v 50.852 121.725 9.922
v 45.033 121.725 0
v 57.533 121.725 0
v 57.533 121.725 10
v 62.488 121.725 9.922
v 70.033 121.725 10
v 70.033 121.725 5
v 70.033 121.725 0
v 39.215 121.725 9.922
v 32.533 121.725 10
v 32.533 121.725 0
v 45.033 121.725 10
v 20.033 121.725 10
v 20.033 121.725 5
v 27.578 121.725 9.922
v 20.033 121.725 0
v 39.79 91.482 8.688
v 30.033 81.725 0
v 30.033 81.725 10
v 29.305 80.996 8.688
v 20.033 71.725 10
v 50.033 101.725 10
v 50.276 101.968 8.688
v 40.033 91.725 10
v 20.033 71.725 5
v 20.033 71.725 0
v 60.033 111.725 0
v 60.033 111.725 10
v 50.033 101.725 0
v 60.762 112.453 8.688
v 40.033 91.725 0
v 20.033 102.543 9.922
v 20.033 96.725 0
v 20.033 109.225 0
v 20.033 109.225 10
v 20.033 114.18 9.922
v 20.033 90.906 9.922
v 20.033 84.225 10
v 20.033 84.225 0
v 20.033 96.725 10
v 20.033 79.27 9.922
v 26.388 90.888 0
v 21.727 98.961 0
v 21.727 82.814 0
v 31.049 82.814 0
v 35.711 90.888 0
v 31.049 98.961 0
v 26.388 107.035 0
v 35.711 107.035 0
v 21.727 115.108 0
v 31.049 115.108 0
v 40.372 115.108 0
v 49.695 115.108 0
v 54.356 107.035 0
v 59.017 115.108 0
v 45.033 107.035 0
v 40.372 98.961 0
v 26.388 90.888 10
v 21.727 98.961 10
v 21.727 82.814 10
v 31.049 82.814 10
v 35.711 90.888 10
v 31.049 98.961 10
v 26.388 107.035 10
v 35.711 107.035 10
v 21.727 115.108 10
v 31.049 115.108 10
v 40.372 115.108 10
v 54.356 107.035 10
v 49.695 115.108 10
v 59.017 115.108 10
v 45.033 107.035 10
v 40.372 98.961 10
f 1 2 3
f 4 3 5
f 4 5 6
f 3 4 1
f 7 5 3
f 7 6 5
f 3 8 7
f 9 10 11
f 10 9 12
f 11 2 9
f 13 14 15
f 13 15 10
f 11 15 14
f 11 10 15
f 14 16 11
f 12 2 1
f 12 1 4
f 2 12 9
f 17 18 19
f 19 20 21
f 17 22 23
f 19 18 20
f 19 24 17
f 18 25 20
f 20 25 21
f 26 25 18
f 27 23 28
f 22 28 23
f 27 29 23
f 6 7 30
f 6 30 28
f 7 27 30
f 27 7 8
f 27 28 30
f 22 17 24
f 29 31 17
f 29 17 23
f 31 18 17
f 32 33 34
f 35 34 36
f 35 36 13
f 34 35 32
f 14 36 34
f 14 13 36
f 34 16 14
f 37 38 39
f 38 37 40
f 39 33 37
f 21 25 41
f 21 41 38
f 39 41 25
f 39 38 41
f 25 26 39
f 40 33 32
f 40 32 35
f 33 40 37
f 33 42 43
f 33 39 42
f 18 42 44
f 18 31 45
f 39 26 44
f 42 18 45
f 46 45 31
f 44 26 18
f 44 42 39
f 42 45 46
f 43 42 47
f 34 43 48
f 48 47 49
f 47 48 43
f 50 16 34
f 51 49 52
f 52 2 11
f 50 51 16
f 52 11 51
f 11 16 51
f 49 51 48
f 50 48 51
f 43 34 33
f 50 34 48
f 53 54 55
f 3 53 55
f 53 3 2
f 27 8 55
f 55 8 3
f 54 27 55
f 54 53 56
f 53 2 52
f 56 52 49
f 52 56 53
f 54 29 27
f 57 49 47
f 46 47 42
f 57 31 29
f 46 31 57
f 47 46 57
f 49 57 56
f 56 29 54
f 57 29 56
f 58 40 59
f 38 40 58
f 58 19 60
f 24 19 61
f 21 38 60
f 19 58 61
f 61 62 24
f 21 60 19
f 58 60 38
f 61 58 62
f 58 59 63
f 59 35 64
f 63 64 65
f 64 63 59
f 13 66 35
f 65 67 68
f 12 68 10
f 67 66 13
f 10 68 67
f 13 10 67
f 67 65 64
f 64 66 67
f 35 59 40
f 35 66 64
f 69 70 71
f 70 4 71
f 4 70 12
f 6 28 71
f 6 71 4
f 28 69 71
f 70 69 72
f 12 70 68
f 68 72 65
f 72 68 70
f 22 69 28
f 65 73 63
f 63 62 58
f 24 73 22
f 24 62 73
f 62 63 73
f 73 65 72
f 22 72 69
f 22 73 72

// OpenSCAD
// CSG file generated from FreeCAD 0.20.29177 (Git)
group() {
 group(){
polyhedron ( points = [[20.033276,121.724854,0.000000],[20.033276,121.724854,10.000000],[70.033279,121.724854,0.000000],[70.033279,121.724854,10.000000],[20.033276,71.724854,0.000000],[20.033276,71.724854,10.000000],[20.033276,121.724854,5.000000],[70.033279,121.724854,5.000000],[32.533276,121.724854,0.000000],[45.033276,121.724854,0.000000],[57.533276,121.724854,0.000000],[32.533276,121.724854,10.000000],[45.033276,121.724854,10.000000],[57.533276,121.724854,10.000000],[20.033276,71.724854,5.000000],[60.033276,111.724854,0.000000],[50.033276,101.724854,0.000000],[40.033276,91.724854,0.000000],[30.033276,81.724854,0.000000],[60.033276,111.724854,10.000000],[50.033276,101.724854,10.000000],[40.033276,91.724854,10.000000],[30.033276,81.724854,10.000000],[20.033276,84.224854,0.000000],[20.033276,96.724854,0.000000],[20.033276,109.224854,0.000000],[20.033276,84.224854,10.000000],[20.033276,96.724854,10.000000],[20.033276,109.224854,10.000000],[62.488403,121.724854,9.922277],[50.851650,121.724854,9.922277],[39.214901,121.724854,9.922277],[27.578150,121.724854,9.922277],[29.304789,80.996368,8.687840],[39.790447,91.482025,8.687840],[50.276104,101.967690,8.687840],[60.761765,112.453346,8.687840],[20.033276,114.179985,9.922277],[20.033276,102.543236,9.922277],[20.033276,90.906479,9.922277],[20.033276,79.269730,9.922277],[26.388117,90.887627,0.000000],[35.710697,107.034813,0.000000],[54.355854,107.034813,0.000000],[21.726828,98.961220,0.000000],[31.049406,82.814041,0.000000],[21.726828,82.814041,0.000000],[35.710697,90.887627,0.000000],[31.049406,98.961220,0.000000],[26.388117,107.034813,0.000000],[21.726828,115.108398,0.000000],[31.049406,115.108398,0.000000],[40.371986,115.108398,0.000000],[49.694565,115.108398,0.000000],[59.017143,115.108398,0.000000],[45.033276,107.034813,0.000000],[40.371986,98.961220,0.000000],[26.388117,90.887627,10.000000],[35.710697,107.034813,10.000000],[54.355854,107.034813,10.000000],[21.726828,98.961220,10.000000],[31.049406,82.814041,10.000000],[21.726828,82.814041,10.000000],[35.710697,90.887627,10.000000],[31.049406,98.961220,10.000000],[26.388117,107.034813,10.000000],[21.726828,115.108398,10.000000],[31.049406,115.108398,10.000000],[40.371986,115.108398,10.000000],[49.694565,115.108398,10.000000],[59.017143,115.108398,10.000000],[45.033276,107.034813,10.000000],[40.371986,98.961220,10.000000]], faces = [[10,9,30],[29,10,13],[3,29,13],[30,13,10],[10,29,7],[29,3,7],[7,2,10],[8,11,31],[12,31,11],[31,9,8],[32,6,1],[11,32,1],[6,32,8],[32,11,8],[8,0,6],[30,9,12],[13,30,12],[31,12,9],[22,18,34],[5,33,22],[35,20,34],[33,18,22],[34,21,22],[33,14,18],[5,14,33],[18,14,4],[19,35,15],[35,19,20],[35,16,15],[36,7,3],[19,36,3],[36,15,7],[2,7,15],[36,19,15],[21,34,20],[34,17,16],[35,34,16],[34,18,17],[25,24,38],[37,25,28],[1,37,28],[38,28,25],[25,37,6],[37,1,6],[6,0,25],[23,26,39],[27,39,26],[39,24,23],[40,14,5],[26,40,5],[14,40,23],[40,26,23],[23,4,14],[38,24,27],[28,38,27],[39,27,24],[44,41,24],[41,23,24],[46,41,18],[45,17,18],[46,4,23],[45,18,41],[17,45,47],[18,4,46],[23,41,46],[47,45,41],[48,41,44],[49,44,25],[42,48,49],[44,49,48],[25,0,50],[52,42,51],[8,9,52],[0,51,50],[51,8,52],[51,0,8],[49,51,42],[51,49,50],[24,25,44],[49,25,50],[54,43,53],[54,53,10],[9,10,53],[54,2,15],[10,2,54],[54,15,43],[55,53,43],[52,9,53],[42,52,55],[53,55,52],[15,16,43],[48,42,56],[41,48,47],[16,17,56],[56,17,47],[56,47,48],[55,56,42],[43,16,55],[55,16,56],[60,27,57],[57,27,26],[62,22,57],[61,22,21],[62,26,5],[61,57,22],[21,63,61],[22,62,5],[26,62,57],[63,57,61],[64,60,57],[65,28,60],[58,65,64],[60,64,65],[28,66,1],[68,67,58],[11,68,12],[1,66,67],[67,68,11],[67,11,1],[65,58,67],[67,66,65],[27,60,28],[65,66,28],[70,69,59],[70,13,69],[12,69,13],[70,19,3],[13,70,3],[70,59,19],[71,59,69],[68,69,12],[58,71,68],[69,68,71],[19,59,20],[64,72,58],[57,63,64],[20,72,21],[72,63,21],[72,64,63],[71,58,72],[59,71,20],[71,72,20]]);
}
}
